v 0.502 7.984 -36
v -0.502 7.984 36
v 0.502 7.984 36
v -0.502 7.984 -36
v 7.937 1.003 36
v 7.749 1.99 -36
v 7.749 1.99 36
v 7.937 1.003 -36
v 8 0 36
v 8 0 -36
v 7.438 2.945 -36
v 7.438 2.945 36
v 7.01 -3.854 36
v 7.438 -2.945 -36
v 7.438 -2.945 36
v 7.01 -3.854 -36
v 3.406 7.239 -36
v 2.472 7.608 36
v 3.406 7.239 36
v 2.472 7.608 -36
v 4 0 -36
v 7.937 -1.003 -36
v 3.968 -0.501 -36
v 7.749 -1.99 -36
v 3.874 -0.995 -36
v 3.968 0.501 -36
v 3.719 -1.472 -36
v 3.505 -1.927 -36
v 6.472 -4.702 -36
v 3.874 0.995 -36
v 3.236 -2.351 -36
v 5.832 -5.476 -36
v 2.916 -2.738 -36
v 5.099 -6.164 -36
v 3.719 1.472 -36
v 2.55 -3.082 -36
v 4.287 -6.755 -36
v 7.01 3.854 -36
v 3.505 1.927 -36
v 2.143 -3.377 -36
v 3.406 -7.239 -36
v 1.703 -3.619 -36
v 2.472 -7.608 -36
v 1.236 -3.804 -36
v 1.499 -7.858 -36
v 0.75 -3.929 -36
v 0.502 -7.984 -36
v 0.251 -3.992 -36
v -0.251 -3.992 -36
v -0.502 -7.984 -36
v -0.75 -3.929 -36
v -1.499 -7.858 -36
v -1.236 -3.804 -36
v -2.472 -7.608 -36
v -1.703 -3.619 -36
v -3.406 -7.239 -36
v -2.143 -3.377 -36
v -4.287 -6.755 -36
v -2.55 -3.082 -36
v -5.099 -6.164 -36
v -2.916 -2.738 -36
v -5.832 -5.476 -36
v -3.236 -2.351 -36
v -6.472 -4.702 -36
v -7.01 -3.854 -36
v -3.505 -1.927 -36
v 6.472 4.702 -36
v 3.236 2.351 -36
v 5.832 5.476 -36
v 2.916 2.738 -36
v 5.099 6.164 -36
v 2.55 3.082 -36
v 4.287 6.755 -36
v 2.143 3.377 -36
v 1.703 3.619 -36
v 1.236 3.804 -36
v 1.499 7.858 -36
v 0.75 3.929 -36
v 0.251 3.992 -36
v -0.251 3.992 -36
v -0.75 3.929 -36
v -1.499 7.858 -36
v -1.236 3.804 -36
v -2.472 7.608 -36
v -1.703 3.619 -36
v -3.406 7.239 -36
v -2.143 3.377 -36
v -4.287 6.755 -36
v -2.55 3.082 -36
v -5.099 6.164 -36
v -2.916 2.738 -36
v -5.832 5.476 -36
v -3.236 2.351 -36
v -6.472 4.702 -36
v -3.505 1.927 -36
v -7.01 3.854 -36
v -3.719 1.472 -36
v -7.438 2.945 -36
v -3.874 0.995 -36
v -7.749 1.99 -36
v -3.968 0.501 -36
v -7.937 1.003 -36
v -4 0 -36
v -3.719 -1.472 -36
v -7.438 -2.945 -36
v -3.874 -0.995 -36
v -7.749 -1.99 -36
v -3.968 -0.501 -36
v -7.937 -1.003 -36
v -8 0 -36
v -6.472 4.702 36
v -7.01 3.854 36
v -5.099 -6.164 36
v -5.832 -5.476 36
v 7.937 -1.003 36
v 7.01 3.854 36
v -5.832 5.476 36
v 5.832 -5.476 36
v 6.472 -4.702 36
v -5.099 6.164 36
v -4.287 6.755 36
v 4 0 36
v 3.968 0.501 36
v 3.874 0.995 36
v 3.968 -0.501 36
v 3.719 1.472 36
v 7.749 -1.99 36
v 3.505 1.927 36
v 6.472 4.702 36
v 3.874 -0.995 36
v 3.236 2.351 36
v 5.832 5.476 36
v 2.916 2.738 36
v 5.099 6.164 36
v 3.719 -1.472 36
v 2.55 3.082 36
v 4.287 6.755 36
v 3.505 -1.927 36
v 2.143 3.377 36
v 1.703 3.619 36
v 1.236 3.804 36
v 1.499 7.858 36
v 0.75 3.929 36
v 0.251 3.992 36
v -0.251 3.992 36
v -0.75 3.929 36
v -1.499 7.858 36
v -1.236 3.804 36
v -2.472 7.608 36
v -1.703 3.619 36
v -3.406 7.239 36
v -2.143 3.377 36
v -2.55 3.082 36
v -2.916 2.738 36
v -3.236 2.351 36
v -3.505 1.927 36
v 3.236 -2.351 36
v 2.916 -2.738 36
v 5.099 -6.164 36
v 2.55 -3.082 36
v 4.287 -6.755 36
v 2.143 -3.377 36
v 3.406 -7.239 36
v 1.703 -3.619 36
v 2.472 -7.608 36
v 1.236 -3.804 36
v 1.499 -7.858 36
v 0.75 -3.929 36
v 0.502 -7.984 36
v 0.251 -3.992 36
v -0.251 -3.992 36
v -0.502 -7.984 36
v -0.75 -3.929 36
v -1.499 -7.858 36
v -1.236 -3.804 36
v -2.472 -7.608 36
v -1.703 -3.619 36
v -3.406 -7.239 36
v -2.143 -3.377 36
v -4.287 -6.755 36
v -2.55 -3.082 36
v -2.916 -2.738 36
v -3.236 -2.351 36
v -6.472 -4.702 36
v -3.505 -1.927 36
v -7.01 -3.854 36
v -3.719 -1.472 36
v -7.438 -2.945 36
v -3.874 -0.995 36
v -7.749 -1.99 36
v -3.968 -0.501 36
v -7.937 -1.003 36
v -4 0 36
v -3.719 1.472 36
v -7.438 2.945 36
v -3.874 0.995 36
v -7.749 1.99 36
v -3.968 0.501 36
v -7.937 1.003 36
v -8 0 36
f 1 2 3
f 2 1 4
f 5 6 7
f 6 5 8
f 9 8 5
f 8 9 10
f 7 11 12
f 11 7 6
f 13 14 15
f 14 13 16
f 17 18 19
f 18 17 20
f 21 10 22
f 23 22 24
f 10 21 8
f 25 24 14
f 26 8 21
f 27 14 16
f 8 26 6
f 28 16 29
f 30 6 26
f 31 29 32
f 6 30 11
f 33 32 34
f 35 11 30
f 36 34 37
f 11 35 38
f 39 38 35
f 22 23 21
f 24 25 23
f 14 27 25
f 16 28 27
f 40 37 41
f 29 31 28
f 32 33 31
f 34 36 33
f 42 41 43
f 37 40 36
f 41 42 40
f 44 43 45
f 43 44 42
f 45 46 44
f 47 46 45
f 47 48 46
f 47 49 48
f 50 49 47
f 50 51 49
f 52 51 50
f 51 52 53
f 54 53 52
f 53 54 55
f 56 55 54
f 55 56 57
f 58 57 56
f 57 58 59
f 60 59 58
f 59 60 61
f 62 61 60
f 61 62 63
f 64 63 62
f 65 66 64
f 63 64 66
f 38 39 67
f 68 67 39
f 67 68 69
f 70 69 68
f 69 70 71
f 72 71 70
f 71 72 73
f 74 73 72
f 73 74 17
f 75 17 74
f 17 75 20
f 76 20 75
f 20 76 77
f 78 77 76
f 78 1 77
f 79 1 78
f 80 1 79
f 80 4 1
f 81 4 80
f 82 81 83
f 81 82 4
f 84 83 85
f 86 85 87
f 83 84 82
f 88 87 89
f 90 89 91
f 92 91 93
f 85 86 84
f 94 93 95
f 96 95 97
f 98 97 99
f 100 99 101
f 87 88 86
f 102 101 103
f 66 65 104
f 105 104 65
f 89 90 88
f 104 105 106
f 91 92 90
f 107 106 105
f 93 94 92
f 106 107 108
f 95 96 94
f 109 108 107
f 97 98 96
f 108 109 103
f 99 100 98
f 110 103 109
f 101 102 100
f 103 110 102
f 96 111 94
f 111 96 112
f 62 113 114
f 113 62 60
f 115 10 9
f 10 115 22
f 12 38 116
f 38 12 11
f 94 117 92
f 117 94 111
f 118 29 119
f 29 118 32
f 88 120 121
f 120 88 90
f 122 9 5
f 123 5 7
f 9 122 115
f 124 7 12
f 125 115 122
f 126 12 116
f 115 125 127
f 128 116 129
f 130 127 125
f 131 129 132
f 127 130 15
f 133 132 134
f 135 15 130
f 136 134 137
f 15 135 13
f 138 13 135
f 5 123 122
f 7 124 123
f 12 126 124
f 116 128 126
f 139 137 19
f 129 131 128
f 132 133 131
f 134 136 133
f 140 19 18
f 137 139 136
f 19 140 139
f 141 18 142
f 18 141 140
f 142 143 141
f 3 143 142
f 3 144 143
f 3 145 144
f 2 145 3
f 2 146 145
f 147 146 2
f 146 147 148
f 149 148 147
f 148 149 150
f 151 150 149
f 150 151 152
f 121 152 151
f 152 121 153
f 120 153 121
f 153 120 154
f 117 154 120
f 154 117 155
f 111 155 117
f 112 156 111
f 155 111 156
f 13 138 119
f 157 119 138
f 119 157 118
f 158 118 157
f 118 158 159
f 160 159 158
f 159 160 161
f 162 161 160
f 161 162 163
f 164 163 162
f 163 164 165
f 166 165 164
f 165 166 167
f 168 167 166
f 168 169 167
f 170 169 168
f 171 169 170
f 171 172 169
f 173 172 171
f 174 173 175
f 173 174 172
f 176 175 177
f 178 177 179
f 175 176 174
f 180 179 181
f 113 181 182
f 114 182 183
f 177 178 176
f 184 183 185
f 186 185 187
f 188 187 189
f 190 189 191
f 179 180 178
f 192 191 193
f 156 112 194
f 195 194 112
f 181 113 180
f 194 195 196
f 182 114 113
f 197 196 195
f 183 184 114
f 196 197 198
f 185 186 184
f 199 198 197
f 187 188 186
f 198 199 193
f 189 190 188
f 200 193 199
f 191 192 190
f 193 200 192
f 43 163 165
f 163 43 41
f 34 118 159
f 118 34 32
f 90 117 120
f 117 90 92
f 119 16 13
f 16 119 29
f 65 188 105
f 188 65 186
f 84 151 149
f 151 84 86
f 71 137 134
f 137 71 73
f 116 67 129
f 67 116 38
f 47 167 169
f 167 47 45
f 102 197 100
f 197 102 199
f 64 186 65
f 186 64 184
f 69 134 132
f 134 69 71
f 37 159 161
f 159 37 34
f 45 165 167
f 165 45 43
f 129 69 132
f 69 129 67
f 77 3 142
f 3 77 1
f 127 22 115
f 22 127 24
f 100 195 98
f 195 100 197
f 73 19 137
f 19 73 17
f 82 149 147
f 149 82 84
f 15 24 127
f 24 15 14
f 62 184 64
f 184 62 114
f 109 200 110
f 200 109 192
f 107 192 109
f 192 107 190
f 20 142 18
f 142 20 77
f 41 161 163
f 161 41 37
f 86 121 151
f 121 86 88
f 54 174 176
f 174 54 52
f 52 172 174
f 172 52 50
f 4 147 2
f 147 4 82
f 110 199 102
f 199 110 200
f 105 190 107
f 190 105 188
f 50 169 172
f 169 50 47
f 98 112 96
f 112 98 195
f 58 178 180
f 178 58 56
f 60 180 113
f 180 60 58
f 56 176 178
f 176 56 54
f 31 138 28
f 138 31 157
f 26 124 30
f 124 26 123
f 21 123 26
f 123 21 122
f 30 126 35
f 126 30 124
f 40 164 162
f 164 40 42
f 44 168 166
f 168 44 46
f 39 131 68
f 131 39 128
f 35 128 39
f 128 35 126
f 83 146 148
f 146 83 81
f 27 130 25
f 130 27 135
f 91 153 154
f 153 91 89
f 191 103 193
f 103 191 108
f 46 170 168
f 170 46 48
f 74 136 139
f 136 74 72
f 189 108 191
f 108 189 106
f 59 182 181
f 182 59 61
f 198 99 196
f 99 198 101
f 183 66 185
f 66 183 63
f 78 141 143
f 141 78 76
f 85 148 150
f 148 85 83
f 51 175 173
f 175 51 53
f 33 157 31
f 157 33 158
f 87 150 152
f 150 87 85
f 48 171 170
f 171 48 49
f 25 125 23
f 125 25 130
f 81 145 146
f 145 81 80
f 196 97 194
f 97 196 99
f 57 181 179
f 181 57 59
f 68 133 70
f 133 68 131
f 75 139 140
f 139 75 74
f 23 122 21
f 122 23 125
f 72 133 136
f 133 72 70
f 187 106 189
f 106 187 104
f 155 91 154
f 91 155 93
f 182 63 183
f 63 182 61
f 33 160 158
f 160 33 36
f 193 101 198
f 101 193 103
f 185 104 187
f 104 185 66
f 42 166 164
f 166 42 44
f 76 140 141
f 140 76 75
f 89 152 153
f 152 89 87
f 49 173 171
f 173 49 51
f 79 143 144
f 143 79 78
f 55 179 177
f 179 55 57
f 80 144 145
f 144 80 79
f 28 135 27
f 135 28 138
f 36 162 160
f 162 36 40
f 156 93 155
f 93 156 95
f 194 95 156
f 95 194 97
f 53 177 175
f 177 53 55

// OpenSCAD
$fn = 50;


difference() {
	union() {
		translate(v = [0, 0, -36.0000000000]) {
			cylinder(h = 72, r = 8.0000000000);
		}
	}
	union() {
		translate(v = [0, 0, -100.0000000000]) {
			cylinder(h = 200, r = 4.0000000000);
		}
	}
}
